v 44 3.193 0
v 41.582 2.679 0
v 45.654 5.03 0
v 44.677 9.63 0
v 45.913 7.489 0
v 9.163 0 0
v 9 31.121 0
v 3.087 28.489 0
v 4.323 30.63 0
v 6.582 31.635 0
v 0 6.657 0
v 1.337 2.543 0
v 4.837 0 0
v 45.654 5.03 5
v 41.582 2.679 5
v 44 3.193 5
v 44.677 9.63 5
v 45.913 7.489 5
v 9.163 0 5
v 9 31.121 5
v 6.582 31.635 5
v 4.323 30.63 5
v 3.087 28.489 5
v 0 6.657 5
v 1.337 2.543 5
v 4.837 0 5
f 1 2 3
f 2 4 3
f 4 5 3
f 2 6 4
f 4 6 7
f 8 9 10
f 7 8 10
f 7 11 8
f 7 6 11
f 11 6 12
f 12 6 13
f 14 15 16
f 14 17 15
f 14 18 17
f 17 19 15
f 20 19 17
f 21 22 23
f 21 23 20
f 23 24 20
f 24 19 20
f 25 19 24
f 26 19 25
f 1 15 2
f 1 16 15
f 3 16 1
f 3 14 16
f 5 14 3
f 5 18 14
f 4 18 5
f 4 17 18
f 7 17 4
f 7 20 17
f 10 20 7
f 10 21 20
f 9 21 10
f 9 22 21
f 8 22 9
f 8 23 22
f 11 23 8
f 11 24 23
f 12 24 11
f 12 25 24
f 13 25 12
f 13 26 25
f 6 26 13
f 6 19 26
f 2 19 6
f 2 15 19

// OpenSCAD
$fn = 32;

// ----------------------------------------------------------------------
// Lever arm: two bosses 14 and 8 mm, 35 mm between centres
// ----------------------------------------------------------------------

// --- parameters (mm) ---
profile_height = 5;       // extrusion height
profile_points = 13;      // points of the closed outline

profile = [[0, 6.657], [1.337, 2.543], [4.837, 0], [9.163, 0], [41.582, 2.679], [44, 3.193], [45.654, 5.03], [45.913, 7.489], [44.677, 9.63], [9, 31.121], [6.582, 31.635], [4.323, 30.63], [3.087, 28.489]];  // single closed polygon, 13 points, counter clockwise

// --- the one profile operation ---
linear_extrude(height = profile_height) polygon(points = profile);
